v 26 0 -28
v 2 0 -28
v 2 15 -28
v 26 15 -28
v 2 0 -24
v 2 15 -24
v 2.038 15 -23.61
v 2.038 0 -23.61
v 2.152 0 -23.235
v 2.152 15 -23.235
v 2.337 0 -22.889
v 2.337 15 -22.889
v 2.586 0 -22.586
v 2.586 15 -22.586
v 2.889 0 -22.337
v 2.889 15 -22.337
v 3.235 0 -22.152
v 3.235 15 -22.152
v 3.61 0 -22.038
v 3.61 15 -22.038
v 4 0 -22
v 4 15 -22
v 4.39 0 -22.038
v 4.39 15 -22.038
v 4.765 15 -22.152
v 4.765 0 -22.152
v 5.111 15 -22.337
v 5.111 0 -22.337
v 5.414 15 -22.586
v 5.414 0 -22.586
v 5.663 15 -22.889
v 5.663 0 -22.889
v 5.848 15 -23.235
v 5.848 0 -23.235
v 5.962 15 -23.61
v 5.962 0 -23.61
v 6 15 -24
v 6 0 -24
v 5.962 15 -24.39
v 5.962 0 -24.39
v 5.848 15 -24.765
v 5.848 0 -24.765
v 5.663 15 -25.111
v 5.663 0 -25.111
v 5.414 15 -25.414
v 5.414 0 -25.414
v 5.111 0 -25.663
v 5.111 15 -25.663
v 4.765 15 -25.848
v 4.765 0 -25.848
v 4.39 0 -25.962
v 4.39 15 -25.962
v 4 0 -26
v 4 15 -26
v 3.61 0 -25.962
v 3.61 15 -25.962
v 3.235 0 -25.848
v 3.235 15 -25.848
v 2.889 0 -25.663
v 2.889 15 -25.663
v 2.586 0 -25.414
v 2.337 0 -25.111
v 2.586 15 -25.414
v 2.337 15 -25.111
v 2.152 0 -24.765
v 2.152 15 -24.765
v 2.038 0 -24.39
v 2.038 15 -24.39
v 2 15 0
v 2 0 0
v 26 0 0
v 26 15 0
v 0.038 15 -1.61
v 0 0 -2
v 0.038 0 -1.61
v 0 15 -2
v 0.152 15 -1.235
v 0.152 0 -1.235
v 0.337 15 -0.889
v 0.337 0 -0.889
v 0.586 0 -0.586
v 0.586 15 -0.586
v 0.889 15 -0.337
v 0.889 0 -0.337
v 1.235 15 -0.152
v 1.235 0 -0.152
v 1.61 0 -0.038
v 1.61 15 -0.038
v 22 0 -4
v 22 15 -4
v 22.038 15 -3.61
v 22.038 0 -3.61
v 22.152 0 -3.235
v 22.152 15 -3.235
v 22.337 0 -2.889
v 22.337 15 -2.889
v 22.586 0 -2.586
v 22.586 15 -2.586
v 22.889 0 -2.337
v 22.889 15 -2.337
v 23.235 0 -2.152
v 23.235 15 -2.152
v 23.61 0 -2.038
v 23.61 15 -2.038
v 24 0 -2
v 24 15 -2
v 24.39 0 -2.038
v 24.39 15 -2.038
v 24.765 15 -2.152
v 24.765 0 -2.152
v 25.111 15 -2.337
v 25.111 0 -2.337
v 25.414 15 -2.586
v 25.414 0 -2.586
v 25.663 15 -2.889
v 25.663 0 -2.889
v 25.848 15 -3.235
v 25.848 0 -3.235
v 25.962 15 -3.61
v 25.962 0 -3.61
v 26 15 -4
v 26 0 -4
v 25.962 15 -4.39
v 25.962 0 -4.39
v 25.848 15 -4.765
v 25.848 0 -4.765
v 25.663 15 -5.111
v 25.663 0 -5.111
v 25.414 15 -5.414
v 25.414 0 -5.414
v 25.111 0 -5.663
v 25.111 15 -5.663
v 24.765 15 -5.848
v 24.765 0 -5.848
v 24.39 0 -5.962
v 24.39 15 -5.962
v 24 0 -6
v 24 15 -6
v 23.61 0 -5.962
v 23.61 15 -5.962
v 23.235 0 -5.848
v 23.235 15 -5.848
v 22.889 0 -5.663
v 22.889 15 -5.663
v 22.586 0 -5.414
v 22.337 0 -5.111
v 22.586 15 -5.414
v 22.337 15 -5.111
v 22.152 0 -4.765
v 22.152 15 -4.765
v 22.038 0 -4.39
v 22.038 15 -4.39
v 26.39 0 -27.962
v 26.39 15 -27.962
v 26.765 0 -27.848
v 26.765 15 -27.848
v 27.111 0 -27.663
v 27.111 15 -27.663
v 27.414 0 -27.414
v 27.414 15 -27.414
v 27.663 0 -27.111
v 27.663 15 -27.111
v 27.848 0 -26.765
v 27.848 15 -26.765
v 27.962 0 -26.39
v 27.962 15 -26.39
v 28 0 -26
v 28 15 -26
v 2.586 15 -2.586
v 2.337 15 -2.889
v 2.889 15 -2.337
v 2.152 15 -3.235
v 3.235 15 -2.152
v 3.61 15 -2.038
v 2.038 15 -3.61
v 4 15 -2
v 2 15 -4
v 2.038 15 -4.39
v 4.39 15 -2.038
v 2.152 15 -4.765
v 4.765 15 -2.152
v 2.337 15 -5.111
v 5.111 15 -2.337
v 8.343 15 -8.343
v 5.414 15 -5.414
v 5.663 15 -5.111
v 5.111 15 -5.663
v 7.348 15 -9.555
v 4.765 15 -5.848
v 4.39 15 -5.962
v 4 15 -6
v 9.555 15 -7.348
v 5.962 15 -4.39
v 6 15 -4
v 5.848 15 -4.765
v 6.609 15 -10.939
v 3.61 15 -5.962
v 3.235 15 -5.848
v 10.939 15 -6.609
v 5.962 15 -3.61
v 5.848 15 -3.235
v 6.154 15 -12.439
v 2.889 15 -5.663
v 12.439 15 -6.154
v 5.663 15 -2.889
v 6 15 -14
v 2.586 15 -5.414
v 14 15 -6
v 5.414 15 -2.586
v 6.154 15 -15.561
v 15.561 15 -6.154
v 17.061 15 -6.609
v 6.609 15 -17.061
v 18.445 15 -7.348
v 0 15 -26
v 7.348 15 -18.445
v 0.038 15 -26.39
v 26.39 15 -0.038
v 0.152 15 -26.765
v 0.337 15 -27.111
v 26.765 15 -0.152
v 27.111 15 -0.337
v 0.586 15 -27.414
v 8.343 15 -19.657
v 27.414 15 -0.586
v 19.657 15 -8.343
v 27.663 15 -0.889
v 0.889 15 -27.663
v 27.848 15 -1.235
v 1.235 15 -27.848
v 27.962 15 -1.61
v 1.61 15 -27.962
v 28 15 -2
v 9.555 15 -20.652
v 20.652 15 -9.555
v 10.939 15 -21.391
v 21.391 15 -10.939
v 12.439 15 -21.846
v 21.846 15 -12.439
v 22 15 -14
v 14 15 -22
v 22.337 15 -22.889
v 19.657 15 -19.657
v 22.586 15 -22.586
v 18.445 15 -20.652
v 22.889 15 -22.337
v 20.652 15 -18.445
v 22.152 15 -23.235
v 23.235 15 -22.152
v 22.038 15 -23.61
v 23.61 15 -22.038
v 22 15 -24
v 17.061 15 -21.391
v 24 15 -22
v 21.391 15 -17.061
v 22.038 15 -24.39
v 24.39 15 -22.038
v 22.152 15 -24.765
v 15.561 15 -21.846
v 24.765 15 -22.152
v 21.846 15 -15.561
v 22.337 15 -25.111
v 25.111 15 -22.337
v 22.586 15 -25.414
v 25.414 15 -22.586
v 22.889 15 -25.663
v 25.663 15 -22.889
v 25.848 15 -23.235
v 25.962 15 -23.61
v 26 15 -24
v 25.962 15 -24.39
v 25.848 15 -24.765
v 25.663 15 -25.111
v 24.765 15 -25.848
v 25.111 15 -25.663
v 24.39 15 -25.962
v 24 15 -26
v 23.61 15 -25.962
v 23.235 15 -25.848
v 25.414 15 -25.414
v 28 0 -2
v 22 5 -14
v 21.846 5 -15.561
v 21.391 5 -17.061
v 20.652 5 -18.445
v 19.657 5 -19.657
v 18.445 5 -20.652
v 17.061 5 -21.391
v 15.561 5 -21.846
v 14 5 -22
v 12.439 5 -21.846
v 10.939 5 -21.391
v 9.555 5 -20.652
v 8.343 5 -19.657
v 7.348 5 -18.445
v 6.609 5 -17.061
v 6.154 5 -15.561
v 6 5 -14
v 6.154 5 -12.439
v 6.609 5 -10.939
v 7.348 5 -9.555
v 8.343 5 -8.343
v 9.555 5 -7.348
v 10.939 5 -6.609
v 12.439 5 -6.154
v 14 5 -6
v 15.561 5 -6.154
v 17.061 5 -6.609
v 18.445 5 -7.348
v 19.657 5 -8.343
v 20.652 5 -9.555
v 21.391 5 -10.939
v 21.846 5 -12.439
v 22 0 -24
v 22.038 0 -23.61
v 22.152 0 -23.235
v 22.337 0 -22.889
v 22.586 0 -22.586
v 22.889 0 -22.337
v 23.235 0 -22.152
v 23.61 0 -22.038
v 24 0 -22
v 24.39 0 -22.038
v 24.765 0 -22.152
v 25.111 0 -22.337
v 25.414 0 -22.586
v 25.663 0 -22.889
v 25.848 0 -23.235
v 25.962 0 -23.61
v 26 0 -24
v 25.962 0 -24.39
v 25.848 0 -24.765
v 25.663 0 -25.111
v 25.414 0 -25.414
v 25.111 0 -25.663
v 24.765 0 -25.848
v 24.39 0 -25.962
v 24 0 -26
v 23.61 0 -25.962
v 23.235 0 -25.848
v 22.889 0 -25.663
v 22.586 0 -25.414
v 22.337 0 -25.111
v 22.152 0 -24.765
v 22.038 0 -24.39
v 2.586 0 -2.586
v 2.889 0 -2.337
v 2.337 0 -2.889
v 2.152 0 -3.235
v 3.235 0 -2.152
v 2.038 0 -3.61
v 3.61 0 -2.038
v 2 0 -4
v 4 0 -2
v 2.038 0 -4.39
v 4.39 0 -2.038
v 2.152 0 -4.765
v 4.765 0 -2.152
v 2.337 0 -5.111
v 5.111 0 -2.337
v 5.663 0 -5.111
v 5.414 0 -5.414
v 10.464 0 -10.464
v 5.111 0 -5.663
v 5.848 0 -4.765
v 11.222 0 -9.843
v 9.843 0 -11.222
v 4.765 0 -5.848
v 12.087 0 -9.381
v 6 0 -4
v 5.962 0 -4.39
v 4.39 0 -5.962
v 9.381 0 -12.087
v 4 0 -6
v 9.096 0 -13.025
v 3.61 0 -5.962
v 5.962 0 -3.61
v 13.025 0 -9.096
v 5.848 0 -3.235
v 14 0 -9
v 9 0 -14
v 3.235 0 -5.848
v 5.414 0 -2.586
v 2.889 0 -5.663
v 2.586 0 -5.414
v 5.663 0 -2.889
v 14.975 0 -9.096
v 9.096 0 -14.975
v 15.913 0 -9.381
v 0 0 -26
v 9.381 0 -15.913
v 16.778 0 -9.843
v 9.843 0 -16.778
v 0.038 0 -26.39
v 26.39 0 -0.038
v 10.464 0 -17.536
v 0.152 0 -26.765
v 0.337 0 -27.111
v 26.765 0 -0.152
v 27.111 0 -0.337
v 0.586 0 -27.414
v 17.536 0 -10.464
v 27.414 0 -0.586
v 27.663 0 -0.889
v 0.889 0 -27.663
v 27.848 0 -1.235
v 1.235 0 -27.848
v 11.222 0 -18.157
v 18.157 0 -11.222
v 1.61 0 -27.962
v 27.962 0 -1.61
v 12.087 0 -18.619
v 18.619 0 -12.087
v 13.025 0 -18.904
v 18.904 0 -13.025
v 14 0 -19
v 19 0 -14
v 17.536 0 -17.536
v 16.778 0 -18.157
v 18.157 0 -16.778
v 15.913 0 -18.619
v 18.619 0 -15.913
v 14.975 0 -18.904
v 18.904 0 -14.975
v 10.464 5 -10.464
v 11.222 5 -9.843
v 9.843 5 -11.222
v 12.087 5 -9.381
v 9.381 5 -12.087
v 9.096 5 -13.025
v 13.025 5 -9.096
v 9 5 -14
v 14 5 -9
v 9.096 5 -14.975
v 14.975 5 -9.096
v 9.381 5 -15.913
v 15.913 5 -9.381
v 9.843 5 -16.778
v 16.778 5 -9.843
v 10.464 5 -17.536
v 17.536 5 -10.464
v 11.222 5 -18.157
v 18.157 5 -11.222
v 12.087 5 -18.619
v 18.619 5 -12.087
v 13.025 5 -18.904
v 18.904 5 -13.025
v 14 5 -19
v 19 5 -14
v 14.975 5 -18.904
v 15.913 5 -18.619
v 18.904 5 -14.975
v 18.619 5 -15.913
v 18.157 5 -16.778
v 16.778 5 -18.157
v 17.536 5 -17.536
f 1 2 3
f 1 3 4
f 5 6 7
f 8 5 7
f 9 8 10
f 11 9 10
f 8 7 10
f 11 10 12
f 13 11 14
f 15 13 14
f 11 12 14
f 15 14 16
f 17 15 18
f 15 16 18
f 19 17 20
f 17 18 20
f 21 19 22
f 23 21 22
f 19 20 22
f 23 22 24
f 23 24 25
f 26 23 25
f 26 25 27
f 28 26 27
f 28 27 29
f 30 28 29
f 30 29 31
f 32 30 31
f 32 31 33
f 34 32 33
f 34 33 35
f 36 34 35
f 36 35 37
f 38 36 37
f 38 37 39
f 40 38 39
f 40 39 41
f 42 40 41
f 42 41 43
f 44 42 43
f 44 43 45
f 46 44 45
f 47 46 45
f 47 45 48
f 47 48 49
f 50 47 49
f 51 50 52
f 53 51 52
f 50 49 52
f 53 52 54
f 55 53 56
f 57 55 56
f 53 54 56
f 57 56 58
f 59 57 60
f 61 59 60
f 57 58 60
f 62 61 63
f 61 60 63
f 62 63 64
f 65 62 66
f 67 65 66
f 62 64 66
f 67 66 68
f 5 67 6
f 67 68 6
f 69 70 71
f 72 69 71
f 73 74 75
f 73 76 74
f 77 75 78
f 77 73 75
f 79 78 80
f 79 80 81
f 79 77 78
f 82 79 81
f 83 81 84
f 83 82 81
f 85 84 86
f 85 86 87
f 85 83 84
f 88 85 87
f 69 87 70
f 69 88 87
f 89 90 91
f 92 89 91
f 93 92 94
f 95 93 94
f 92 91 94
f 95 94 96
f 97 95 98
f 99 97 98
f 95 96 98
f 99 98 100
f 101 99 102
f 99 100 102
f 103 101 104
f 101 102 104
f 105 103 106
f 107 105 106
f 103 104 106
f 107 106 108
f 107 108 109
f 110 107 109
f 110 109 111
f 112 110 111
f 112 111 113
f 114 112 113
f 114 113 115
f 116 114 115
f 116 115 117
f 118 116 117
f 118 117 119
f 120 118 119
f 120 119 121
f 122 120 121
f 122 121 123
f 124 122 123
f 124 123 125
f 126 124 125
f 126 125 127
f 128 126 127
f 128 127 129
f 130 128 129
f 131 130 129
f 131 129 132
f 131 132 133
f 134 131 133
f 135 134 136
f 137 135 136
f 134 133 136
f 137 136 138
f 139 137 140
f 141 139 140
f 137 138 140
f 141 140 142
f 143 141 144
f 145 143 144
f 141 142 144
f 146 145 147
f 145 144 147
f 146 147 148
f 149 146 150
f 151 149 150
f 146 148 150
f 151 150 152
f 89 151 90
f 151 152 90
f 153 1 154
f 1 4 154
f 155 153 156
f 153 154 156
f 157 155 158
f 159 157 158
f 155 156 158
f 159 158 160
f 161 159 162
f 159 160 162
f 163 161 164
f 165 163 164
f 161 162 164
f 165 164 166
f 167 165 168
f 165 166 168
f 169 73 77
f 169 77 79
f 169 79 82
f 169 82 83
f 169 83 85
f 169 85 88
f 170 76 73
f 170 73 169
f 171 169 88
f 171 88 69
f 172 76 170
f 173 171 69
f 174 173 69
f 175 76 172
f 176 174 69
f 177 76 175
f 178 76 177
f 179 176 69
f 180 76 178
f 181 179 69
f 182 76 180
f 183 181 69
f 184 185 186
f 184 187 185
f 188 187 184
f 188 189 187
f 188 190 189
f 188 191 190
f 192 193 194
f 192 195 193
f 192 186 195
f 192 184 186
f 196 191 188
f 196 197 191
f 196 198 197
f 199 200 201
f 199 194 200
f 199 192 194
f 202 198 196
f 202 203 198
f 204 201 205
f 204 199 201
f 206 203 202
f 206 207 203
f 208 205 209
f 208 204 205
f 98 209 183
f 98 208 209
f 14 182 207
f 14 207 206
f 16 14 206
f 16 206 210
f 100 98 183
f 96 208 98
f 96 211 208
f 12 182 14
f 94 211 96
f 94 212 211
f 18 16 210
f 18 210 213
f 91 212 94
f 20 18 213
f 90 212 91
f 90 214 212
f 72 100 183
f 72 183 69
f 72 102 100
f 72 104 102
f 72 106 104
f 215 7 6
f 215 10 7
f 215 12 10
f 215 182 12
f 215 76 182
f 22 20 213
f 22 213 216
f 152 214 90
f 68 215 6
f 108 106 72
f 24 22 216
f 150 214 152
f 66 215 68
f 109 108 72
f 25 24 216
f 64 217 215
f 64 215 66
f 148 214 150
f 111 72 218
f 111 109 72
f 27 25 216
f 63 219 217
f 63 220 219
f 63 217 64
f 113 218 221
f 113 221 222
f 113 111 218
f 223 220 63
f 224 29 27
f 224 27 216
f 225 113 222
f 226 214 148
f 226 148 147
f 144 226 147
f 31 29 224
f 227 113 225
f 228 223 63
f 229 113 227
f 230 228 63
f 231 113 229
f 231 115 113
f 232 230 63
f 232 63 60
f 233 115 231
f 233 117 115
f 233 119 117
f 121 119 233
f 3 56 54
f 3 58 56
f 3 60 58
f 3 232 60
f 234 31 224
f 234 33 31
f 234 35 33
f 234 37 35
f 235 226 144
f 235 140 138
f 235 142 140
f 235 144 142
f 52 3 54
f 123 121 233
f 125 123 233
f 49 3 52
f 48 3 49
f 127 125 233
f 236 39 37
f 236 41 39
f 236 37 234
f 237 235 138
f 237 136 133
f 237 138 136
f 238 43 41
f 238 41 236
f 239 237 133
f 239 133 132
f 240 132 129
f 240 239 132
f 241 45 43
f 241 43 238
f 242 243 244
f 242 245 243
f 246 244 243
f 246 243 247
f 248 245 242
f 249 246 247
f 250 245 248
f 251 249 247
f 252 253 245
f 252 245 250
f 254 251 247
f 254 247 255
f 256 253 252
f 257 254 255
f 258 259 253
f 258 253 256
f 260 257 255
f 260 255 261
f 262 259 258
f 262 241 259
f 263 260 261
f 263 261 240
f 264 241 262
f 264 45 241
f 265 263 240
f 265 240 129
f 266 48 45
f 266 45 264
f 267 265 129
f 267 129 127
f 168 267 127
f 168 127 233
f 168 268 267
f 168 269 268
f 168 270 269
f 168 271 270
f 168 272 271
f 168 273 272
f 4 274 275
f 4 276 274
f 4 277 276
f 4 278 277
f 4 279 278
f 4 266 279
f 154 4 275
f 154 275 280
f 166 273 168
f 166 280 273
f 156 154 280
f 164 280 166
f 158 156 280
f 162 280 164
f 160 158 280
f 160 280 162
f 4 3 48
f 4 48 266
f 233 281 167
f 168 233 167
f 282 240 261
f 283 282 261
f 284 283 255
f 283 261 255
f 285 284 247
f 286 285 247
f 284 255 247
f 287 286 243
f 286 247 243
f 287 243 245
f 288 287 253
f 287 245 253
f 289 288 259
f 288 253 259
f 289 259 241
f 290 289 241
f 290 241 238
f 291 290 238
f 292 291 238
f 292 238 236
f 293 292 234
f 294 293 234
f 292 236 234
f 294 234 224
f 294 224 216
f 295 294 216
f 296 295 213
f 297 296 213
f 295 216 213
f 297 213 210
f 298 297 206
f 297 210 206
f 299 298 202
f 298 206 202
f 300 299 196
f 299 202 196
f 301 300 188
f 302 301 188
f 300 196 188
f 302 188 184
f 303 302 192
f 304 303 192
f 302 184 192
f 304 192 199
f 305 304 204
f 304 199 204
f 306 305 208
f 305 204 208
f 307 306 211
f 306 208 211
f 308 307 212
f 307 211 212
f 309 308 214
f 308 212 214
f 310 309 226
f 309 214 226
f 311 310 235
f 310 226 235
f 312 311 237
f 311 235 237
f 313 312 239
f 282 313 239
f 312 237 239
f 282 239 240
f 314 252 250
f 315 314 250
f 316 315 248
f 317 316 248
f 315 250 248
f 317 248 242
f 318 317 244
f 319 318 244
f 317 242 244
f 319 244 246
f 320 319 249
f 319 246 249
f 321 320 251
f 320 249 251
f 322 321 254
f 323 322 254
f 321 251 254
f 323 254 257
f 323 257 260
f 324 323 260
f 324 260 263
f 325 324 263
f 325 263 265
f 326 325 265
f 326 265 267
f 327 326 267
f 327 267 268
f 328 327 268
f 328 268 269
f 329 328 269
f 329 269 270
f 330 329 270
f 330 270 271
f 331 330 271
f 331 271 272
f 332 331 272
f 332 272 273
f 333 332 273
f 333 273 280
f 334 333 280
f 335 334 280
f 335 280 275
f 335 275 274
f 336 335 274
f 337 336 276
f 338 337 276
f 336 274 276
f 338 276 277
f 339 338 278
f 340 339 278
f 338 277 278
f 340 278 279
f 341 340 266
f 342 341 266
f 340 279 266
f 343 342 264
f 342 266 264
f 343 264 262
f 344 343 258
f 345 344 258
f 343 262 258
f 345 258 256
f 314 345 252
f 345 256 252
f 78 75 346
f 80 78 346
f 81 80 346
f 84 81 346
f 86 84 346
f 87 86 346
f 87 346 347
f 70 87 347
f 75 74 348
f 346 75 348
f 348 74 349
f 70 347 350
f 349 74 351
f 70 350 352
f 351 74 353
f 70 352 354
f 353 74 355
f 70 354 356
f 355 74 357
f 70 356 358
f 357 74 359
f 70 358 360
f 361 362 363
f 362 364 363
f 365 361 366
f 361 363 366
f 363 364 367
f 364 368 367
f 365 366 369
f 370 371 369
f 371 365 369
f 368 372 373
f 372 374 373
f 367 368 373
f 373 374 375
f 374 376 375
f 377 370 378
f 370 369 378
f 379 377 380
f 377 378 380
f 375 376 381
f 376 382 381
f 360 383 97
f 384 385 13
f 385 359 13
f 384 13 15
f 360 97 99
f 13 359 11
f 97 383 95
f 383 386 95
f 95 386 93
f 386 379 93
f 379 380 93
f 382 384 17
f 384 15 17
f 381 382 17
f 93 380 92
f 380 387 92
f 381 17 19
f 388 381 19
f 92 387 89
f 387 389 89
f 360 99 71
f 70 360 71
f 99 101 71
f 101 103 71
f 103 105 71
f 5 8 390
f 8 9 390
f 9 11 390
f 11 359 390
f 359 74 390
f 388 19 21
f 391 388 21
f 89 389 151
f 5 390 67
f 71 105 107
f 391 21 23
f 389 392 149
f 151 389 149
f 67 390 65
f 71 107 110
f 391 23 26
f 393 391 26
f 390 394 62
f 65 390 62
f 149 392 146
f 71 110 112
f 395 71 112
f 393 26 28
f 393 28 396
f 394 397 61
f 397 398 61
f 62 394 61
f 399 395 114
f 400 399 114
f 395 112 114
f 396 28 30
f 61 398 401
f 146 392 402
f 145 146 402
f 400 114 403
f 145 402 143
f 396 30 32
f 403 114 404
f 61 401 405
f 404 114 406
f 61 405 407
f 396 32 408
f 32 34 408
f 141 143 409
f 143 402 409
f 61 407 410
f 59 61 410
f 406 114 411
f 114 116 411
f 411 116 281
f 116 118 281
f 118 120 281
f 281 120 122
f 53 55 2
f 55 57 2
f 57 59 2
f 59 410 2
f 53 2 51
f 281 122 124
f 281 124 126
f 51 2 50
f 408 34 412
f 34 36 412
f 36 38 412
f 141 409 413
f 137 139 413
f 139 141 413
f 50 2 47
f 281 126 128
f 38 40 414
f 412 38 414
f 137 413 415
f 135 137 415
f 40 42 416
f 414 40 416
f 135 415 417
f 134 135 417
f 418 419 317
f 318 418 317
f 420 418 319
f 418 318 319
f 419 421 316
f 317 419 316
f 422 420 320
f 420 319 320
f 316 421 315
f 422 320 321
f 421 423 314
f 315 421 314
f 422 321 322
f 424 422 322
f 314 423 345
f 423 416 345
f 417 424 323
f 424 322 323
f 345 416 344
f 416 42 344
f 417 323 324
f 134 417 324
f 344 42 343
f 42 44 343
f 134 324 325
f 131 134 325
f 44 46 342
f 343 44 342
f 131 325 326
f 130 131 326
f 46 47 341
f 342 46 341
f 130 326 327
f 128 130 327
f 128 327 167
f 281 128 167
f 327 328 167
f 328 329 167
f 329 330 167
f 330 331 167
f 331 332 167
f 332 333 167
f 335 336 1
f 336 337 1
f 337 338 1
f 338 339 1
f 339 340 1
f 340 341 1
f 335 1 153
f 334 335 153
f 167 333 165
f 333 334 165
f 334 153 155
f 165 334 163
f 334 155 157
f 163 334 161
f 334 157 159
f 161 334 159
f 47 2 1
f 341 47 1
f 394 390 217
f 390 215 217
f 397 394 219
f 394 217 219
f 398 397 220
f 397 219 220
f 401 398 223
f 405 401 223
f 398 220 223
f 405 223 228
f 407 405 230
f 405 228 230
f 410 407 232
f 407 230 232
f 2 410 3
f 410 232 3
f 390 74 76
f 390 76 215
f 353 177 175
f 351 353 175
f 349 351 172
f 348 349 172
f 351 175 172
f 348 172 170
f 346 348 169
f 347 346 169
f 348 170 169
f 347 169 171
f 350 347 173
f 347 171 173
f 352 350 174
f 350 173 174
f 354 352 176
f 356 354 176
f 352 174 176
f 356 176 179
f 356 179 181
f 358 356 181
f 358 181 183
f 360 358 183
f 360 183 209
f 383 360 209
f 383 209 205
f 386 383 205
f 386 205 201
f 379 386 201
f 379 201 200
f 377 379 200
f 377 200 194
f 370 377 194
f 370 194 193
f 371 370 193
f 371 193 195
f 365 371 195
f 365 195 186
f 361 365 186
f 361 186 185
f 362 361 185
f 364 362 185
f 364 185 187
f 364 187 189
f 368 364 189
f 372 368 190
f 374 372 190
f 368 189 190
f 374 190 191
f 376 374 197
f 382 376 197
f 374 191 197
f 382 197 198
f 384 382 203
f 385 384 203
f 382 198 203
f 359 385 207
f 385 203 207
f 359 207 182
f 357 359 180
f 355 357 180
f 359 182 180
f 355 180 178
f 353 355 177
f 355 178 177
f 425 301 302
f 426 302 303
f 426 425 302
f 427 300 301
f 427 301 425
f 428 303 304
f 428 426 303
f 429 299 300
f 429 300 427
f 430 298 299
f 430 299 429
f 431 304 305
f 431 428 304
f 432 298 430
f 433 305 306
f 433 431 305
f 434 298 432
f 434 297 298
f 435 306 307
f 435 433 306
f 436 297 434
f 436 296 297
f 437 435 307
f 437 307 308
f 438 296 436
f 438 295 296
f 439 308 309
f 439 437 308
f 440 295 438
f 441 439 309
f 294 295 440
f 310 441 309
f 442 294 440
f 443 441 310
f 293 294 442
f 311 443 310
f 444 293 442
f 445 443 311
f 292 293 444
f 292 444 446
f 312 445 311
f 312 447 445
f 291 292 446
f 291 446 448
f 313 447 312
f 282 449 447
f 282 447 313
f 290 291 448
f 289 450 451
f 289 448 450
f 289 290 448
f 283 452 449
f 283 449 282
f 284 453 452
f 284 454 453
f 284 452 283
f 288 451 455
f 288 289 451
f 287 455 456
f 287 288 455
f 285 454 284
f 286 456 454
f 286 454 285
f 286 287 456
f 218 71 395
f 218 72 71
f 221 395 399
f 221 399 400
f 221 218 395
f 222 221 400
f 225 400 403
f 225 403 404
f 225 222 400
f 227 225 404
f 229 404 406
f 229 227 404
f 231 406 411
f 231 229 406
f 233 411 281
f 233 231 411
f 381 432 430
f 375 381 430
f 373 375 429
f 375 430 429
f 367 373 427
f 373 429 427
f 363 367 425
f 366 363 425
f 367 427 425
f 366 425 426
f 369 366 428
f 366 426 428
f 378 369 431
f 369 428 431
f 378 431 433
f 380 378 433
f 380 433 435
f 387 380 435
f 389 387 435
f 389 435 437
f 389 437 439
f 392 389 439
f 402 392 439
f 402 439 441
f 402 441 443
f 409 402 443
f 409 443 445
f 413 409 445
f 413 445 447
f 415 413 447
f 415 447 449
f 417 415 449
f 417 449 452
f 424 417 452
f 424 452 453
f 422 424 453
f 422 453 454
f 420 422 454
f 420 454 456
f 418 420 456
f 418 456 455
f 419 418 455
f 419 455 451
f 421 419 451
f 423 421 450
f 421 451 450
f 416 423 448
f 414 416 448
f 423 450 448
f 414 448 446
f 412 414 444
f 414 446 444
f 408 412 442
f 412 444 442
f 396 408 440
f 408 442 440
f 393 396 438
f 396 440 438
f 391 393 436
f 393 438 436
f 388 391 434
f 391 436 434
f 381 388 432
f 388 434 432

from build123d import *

# Parameters (mm, degrees)
SKETCH1_W           = 28
SKETCH1_H           = 28
BOSS_EXTRUDE1_DEPTH = 15
SKETCH2_R           = 5
SKETCH2_R_2         = 2
CUT_EXTRUDE1_DEPTH  = 16
SKETCH3_R           = 8
CUT_EXTRUDE2_DEPTH  = 10
FILLET1_R           = 2


with BuildPart() as part:
    # Sketch1 → Boss-Extrude1 (new body)
    with BuildSketch(Plane(origin=(0, 0, 0), x_dir=(1, 0, 0), z_dir=(0, 1, 0))):
        with Locations((14, 14)):
            Rectangle(SKETCH1_W, SKETCH1_H)
    extrude(amount=BOSS_EXTRUDE1_DEPTH)

    # Sketch2 → Cut-Extrude1 (cut, through all)
    with BuildSketch(Plane(origin=(0, 15, 0), x_dir=(-1, 0, 0), z_dir=(0, 1, 0))):
        with Locations((-14, -14)):
            Circle(SKETCH2_R)
        with Locations((-4, -24)):
            Circle(SKETCH2_R_2)
        with Locations((-24, -24)):
            Circle(SKETCH2_R_2)
        with Locations((-4, -4)):
            Circle(SKETCH2_R_2)
        with Locations((-24, -4)):
            Circle(SKETCH2_R_2)
    extrude(amount=-CUT_EXTRUDE1_DEPTH, mode=Mode.SUBTRACT)

    # Sketch3 → Cut-Extrude2 (cut)
    with BuildSketch(Plane(origin=(0, 15, 0), x_dir=(1, 0, 0), z_dir=(0, 1, 0))):
        with Locations((14, 14)):
            Circle(SKETCH3_R)
    extrude(amount=-CUT_EXTRUDE2_DEPTH, mode=Mode.SUBTRACT)

    # Fillet1
    fillet1_edges = [part.edges().sort_by_distance(p)[0] for p in [
        (0, 7.5, 0),
        (0, 7.5, -28),
        (28, 7.5, -28),
        (28, 7.5, 0),
    ]]
    fillet(fillet1_edges, radius=FILLET1_R)


solid = part.part
